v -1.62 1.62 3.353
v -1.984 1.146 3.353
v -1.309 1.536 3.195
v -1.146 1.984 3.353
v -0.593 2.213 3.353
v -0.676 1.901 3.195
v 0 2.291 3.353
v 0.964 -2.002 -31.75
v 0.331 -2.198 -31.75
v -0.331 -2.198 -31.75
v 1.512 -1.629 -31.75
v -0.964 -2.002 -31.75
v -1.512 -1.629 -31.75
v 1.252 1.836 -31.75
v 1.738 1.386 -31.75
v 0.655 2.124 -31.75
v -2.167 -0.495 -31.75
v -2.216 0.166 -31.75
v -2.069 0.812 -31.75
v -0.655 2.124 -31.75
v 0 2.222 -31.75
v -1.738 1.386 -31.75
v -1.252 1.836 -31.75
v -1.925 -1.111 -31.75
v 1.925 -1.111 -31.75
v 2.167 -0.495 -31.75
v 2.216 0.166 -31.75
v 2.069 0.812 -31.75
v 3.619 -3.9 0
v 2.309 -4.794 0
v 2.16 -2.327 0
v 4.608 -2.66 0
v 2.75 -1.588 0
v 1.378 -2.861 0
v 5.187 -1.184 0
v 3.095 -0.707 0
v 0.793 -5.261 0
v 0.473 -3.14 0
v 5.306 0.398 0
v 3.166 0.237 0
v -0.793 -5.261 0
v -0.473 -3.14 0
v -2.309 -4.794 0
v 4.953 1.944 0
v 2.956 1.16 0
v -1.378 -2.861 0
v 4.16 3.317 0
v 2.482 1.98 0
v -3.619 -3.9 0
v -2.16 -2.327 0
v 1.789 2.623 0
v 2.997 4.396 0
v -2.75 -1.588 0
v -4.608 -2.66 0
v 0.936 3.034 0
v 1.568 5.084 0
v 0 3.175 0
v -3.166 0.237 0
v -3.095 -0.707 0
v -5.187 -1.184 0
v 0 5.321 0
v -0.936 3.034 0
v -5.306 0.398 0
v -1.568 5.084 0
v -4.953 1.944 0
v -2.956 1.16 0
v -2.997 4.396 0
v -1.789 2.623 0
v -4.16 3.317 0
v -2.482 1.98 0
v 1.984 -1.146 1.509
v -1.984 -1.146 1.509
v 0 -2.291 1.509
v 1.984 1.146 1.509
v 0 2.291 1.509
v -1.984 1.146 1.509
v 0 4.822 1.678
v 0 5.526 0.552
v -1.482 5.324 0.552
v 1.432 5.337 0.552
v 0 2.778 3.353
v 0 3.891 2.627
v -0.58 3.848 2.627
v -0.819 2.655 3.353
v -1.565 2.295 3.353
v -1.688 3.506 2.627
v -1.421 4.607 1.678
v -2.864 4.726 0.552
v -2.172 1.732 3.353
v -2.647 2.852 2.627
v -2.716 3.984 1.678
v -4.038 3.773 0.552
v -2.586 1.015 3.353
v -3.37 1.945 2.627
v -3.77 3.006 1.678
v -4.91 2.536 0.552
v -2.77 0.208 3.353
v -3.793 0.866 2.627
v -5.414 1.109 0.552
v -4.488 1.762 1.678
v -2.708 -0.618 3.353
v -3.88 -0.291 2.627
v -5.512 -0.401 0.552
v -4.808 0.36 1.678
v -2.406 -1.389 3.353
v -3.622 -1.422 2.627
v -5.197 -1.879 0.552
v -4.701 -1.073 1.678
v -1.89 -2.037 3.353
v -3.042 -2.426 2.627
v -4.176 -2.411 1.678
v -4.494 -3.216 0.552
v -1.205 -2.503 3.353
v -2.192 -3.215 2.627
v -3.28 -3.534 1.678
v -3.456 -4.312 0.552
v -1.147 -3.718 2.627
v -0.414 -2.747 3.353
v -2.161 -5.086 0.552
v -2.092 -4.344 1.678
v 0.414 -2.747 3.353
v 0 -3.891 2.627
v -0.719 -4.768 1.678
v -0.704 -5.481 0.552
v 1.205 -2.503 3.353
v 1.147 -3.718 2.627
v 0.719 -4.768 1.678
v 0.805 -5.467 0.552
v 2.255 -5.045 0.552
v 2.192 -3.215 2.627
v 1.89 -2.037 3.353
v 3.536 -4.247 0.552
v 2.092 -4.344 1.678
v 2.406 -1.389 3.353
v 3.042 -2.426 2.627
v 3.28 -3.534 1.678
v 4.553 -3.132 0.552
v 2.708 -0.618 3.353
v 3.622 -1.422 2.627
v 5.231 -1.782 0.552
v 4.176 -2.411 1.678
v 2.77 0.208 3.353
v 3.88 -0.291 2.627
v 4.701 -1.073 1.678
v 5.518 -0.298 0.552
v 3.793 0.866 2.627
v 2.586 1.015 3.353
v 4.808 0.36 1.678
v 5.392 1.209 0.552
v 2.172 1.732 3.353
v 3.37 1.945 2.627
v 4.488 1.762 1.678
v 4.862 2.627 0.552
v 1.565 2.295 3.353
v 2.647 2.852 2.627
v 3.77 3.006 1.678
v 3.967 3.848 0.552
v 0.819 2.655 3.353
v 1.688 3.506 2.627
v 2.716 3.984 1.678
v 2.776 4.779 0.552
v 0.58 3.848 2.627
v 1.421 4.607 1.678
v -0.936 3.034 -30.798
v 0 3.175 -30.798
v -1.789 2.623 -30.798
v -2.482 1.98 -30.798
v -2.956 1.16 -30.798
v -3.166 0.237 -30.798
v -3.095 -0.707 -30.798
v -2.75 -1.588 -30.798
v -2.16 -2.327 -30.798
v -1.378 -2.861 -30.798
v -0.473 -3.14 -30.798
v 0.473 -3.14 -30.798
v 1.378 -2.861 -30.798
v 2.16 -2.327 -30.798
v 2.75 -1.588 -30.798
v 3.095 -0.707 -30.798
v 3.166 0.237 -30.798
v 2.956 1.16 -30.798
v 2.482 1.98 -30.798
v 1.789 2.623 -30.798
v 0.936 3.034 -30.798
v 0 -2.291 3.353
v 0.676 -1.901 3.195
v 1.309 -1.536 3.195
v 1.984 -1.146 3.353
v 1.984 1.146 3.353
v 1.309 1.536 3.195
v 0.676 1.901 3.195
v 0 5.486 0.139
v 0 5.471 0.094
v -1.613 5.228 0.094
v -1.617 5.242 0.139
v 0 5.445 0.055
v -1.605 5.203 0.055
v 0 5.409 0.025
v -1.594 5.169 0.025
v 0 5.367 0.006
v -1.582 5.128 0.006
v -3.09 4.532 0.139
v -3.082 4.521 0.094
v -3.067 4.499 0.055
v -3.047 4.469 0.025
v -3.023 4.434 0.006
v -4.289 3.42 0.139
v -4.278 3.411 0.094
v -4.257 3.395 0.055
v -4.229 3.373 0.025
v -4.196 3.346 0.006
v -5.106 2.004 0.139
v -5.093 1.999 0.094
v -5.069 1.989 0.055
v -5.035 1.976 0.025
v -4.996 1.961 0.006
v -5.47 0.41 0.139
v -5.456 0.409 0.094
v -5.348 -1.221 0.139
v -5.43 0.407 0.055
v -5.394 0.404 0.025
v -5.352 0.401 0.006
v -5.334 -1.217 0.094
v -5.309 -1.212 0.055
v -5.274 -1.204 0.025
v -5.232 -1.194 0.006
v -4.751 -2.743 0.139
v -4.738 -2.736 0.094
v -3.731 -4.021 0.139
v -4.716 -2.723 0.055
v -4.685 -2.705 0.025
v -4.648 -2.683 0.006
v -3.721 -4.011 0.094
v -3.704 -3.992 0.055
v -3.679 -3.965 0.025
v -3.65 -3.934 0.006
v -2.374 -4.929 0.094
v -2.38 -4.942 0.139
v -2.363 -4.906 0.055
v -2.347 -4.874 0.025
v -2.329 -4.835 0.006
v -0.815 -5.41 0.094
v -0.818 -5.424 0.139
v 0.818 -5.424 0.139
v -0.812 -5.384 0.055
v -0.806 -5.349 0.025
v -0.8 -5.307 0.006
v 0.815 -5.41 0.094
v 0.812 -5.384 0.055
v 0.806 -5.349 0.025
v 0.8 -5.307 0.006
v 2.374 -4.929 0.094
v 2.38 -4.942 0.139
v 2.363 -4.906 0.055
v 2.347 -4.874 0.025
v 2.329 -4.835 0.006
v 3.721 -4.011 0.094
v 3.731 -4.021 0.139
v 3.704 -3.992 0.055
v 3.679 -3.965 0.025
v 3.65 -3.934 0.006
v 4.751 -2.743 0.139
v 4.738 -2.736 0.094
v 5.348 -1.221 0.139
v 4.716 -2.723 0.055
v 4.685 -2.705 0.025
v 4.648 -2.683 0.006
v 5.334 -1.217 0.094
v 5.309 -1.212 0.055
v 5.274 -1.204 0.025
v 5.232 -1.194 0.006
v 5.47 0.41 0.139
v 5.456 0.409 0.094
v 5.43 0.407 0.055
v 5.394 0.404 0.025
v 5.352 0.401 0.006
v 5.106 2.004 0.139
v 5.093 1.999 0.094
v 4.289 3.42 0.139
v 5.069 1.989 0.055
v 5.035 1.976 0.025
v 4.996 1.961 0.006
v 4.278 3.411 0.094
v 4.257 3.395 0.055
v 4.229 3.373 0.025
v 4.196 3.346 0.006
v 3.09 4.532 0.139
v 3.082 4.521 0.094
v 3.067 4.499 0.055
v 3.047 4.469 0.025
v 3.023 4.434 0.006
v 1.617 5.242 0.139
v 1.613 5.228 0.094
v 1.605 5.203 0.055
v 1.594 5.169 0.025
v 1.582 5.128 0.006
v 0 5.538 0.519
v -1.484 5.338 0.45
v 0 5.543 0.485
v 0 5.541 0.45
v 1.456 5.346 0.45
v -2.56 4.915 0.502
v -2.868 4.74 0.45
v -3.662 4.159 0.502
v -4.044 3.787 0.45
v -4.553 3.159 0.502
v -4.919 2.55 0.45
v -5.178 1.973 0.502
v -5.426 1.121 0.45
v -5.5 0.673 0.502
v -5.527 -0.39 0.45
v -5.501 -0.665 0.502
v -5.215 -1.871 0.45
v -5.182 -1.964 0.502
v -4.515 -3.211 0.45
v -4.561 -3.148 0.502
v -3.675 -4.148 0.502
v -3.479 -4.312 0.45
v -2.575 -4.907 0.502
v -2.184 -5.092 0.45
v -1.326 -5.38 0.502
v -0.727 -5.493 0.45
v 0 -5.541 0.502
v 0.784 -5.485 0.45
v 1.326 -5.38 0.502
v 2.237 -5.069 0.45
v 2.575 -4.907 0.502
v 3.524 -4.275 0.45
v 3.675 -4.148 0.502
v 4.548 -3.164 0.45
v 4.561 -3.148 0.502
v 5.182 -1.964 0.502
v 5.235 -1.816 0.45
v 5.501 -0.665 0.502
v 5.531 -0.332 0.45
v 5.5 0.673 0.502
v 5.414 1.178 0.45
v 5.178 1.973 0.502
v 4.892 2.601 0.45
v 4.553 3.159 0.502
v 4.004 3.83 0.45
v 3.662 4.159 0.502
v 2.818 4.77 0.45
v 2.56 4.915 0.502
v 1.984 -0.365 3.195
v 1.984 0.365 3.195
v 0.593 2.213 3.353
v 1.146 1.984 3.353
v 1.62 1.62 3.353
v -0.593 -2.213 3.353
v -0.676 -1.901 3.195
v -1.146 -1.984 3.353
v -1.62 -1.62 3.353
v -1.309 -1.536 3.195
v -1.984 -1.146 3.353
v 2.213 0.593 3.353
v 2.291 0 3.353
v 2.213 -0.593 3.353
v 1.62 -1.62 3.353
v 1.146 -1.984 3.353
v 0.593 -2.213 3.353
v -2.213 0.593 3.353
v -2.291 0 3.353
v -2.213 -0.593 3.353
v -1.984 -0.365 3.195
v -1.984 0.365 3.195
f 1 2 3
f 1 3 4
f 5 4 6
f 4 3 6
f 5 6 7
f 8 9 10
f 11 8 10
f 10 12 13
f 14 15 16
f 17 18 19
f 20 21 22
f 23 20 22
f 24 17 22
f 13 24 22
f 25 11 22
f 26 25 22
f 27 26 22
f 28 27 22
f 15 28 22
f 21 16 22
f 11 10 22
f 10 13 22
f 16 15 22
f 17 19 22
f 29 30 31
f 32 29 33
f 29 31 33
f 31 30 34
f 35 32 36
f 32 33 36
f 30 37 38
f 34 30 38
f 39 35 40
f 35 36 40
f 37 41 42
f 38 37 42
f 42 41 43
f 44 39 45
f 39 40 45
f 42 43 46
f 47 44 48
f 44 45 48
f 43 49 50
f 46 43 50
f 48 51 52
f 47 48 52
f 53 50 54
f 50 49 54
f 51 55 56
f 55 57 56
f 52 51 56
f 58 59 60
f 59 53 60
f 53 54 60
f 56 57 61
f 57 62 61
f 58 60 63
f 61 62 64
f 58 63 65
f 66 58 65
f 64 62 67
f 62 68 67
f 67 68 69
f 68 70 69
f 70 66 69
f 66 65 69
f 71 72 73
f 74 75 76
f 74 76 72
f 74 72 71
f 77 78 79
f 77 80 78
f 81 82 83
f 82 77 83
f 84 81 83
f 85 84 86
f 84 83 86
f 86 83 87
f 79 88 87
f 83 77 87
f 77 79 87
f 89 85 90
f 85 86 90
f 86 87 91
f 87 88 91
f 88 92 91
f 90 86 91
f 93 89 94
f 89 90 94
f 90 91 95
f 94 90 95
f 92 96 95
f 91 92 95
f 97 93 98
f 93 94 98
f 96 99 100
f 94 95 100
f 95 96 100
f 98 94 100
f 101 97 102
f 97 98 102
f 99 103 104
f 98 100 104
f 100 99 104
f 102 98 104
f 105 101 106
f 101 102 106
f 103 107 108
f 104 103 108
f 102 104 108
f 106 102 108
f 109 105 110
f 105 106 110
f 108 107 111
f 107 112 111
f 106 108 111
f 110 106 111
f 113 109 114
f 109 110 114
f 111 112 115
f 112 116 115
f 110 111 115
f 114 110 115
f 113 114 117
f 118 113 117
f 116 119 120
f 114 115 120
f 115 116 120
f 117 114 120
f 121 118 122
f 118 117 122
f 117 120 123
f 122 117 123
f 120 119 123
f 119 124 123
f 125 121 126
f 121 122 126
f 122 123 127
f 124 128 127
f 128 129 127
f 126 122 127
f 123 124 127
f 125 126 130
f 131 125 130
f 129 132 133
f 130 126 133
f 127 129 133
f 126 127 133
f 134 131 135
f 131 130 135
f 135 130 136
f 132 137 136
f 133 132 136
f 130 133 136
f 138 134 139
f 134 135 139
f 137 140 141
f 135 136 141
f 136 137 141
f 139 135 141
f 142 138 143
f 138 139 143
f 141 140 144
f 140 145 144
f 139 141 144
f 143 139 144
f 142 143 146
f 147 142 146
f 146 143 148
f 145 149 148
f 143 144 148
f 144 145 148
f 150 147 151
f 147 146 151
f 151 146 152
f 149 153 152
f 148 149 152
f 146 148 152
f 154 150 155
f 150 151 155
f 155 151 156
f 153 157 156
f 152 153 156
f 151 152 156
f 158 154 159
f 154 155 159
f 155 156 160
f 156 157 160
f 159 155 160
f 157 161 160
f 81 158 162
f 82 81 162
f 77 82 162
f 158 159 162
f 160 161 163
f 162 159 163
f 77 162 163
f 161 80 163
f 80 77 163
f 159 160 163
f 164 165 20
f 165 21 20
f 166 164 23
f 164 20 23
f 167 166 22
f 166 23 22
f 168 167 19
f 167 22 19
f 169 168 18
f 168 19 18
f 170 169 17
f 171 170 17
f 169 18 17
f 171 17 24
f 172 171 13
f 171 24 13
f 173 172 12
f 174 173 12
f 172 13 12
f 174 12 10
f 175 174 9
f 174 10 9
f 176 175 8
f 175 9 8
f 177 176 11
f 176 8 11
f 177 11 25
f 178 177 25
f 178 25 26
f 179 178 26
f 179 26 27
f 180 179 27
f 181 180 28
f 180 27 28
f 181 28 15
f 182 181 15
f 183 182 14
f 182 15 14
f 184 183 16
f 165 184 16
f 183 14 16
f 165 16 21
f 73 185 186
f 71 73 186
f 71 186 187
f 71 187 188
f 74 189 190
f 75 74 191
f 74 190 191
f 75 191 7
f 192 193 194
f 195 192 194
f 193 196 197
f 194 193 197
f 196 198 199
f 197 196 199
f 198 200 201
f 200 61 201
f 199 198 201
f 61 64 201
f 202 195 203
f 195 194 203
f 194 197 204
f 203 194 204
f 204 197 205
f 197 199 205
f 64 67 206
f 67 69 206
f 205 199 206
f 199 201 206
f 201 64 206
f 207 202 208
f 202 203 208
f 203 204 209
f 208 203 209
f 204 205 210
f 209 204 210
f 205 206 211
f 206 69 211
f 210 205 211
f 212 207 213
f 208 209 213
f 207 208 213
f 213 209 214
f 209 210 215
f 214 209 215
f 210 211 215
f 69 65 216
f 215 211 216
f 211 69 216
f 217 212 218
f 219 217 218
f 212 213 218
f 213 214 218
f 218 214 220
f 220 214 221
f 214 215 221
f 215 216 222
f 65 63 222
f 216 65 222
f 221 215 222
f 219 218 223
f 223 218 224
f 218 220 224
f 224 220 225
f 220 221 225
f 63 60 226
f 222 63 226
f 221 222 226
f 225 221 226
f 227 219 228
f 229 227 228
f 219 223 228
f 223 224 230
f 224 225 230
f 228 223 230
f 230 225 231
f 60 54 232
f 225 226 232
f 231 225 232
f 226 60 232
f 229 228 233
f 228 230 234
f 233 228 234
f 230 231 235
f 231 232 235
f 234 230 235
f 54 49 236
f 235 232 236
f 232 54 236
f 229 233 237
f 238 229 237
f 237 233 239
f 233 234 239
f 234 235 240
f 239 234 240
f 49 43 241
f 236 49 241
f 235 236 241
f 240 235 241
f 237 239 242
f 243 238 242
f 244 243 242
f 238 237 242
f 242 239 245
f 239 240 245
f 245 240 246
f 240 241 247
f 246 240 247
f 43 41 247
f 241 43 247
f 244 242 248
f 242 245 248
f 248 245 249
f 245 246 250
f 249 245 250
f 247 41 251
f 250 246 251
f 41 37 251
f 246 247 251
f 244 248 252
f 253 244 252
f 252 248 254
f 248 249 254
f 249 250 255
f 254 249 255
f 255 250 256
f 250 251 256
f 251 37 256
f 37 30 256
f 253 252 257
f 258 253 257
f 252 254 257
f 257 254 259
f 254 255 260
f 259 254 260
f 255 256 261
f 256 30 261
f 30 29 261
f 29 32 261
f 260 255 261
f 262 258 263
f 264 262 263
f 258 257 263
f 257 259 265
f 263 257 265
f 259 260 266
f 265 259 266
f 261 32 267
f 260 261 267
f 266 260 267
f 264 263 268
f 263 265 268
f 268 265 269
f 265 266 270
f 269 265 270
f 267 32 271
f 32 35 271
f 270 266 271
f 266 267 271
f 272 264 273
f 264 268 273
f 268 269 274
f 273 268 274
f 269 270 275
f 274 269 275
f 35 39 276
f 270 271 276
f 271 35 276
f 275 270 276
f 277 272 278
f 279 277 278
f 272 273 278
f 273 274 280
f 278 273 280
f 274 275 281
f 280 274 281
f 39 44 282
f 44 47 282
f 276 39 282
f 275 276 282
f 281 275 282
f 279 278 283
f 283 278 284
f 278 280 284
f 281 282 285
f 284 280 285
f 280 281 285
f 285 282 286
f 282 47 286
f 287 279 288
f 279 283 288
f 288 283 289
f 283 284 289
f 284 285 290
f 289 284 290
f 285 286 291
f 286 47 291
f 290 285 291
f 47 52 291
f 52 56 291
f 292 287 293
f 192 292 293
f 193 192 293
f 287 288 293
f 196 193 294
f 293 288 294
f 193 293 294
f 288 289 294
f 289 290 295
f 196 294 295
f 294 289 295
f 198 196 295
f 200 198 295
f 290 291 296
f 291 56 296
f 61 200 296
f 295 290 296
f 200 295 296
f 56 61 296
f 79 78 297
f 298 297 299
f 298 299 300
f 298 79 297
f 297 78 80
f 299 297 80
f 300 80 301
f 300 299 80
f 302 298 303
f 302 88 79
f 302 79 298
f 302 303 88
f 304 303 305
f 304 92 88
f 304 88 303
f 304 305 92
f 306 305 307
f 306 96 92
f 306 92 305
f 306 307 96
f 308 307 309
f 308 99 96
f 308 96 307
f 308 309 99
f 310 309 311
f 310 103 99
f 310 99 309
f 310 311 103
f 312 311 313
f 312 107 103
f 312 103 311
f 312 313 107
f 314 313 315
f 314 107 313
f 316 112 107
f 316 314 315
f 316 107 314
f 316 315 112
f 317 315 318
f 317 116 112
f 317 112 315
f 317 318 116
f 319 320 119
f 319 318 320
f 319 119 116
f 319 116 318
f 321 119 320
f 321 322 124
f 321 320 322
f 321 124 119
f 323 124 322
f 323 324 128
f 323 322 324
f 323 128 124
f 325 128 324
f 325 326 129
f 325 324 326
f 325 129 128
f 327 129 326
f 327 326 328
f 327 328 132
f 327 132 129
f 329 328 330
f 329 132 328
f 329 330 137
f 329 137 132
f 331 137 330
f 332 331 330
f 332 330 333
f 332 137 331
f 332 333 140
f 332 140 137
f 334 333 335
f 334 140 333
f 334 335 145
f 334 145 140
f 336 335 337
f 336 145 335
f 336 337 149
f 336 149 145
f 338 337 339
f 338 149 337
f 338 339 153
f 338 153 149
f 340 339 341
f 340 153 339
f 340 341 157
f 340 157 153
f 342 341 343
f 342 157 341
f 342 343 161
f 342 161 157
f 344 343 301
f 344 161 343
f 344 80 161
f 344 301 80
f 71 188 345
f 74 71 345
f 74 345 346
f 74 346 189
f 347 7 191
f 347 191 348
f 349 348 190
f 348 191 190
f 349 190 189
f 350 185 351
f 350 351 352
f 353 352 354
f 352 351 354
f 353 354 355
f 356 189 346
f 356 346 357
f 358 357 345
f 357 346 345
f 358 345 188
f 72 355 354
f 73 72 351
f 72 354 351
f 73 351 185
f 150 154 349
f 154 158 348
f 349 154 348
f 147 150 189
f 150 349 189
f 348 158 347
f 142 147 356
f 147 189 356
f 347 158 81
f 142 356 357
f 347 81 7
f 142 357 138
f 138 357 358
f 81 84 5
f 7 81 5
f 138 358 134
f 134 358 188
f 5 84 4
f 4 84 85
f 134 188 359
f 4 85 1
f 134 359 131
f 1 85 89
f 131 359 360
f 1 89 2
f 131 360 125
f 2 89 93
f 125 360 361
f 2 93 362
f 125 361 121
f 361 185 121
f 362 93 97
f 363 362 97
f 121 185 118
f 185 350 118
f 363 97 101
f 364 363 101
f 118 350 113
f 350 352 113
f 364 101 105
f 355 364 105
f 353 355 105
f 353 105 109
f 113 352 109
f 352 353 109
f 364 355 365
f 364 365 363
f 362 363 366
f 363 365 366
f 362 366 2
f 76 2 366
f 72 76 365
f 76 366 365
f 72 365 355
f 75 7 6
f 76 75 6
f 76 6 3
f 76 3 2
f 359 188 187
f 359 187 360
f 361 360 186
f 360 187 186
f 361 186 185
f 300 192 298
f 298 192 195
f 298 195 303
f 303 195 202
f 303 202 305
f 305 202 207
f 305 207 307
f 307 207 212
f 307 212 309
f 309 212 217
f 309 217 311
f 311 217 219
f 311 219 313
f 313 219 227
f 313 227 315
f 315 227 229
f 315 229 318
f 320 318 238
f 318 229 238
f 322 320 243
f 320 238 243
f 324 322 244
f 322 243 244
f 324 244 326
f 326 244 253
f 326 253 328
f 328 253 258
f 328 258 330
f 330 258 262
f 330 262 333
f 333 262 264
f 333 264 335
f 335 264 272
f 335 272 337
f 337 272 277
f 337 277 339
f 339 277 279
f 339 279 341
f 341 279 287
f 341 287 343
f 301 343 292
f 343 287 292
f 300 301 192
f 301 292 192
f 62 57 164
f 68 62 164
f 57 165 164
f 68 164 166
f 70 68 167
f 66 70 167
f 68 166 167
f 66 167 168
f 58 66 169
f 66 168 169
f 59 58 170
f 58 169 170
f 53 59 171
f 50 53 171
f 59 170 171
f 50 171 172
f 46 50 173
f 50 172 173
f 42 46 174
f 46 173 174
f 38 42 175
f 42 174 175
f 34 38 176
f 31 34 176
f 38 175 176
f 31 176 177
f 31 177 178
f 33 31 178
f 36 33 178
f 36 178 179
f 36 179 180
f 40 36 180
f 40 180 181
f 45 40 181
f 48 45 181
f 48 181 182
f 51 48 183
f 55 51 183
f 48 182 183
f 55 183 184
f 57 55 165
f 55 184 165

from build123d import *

# Parameters (mm, degrees)
CUT_EXTRUDE1_DEPTH = 1.84404
FILLET1_R          = 0.16764


with BuildPart() as part:
    # Sketch2 → Revolve1 (revolve)
    with BuildSketch(Plane(origin=(0, 0, 0), x_dir=(0, 0, -1), z_dir=(1, 0, 0))):
        with BuildLine():
            Line((31.75, 0), (-3.3528, 0))
            Line((-3.3528, 0), (-3.3528, 2.778125))
            ThreePointArc((-3.3528, 2.778125), (-2.158424687, 4.401074199), (-0.50292, 5.5499))
            Line((-0.50292, 5.5499), (0, 5.461221635))
            Line((0, 5.461221635), (0, 3.175))
            Line((0, 3.175), (30.7975, 3.175))
            Line((30.7975, 3.175), (31.75, 2.2225))
            Line((31.75, 2.2225), (31.75, 0))
        make_face()
    revolve(axis=Axis((0, 0, -31.75), (0, 0, 1)))

    # Sketch3 → Cut-Extrude1 (cut)
    with BuildSketch(Plane.XY.offset(3.3528)):
        Polygon((0, 2.291358881), (-1.984375, 1.14567944), (-1.984375, -1.14567944), (0, -2.291358881), (1.984375, -1.14567944), (1.984375, 1.14567944), align=None)
    extrude(amount=-CUT_EXTRUDE1_DEPTH, mode=Mode.SUBTRACT)

    # Cut-Extrude2 cone 1 section (through the dimple's axis) → Cut-Extrude2 (revolve, cut)
    with BuildSketch(Plane(origin=(0, 0, 3.3528), x_dir=(0, -1, 0), z_dir=(1, 0, 0))):
        Polygon((0, 0), (2.291358881, 0), (0, 1.322916667), align=None)
    revolve(axis=Axis((0, 0, 3.3528), (0, 0, -1)), mode=Mode.SUBTRACT)

    # Fillet1
    fillet1_edges = [part.edges().sort_by_distance(p)[0] for p in [
        (0, -5.5499, 0.50292),
        (0, -5.461221635, 0),
    ]]
    fillet(fillet1_edges, radius=FILLET1_R)


solid = part.part
